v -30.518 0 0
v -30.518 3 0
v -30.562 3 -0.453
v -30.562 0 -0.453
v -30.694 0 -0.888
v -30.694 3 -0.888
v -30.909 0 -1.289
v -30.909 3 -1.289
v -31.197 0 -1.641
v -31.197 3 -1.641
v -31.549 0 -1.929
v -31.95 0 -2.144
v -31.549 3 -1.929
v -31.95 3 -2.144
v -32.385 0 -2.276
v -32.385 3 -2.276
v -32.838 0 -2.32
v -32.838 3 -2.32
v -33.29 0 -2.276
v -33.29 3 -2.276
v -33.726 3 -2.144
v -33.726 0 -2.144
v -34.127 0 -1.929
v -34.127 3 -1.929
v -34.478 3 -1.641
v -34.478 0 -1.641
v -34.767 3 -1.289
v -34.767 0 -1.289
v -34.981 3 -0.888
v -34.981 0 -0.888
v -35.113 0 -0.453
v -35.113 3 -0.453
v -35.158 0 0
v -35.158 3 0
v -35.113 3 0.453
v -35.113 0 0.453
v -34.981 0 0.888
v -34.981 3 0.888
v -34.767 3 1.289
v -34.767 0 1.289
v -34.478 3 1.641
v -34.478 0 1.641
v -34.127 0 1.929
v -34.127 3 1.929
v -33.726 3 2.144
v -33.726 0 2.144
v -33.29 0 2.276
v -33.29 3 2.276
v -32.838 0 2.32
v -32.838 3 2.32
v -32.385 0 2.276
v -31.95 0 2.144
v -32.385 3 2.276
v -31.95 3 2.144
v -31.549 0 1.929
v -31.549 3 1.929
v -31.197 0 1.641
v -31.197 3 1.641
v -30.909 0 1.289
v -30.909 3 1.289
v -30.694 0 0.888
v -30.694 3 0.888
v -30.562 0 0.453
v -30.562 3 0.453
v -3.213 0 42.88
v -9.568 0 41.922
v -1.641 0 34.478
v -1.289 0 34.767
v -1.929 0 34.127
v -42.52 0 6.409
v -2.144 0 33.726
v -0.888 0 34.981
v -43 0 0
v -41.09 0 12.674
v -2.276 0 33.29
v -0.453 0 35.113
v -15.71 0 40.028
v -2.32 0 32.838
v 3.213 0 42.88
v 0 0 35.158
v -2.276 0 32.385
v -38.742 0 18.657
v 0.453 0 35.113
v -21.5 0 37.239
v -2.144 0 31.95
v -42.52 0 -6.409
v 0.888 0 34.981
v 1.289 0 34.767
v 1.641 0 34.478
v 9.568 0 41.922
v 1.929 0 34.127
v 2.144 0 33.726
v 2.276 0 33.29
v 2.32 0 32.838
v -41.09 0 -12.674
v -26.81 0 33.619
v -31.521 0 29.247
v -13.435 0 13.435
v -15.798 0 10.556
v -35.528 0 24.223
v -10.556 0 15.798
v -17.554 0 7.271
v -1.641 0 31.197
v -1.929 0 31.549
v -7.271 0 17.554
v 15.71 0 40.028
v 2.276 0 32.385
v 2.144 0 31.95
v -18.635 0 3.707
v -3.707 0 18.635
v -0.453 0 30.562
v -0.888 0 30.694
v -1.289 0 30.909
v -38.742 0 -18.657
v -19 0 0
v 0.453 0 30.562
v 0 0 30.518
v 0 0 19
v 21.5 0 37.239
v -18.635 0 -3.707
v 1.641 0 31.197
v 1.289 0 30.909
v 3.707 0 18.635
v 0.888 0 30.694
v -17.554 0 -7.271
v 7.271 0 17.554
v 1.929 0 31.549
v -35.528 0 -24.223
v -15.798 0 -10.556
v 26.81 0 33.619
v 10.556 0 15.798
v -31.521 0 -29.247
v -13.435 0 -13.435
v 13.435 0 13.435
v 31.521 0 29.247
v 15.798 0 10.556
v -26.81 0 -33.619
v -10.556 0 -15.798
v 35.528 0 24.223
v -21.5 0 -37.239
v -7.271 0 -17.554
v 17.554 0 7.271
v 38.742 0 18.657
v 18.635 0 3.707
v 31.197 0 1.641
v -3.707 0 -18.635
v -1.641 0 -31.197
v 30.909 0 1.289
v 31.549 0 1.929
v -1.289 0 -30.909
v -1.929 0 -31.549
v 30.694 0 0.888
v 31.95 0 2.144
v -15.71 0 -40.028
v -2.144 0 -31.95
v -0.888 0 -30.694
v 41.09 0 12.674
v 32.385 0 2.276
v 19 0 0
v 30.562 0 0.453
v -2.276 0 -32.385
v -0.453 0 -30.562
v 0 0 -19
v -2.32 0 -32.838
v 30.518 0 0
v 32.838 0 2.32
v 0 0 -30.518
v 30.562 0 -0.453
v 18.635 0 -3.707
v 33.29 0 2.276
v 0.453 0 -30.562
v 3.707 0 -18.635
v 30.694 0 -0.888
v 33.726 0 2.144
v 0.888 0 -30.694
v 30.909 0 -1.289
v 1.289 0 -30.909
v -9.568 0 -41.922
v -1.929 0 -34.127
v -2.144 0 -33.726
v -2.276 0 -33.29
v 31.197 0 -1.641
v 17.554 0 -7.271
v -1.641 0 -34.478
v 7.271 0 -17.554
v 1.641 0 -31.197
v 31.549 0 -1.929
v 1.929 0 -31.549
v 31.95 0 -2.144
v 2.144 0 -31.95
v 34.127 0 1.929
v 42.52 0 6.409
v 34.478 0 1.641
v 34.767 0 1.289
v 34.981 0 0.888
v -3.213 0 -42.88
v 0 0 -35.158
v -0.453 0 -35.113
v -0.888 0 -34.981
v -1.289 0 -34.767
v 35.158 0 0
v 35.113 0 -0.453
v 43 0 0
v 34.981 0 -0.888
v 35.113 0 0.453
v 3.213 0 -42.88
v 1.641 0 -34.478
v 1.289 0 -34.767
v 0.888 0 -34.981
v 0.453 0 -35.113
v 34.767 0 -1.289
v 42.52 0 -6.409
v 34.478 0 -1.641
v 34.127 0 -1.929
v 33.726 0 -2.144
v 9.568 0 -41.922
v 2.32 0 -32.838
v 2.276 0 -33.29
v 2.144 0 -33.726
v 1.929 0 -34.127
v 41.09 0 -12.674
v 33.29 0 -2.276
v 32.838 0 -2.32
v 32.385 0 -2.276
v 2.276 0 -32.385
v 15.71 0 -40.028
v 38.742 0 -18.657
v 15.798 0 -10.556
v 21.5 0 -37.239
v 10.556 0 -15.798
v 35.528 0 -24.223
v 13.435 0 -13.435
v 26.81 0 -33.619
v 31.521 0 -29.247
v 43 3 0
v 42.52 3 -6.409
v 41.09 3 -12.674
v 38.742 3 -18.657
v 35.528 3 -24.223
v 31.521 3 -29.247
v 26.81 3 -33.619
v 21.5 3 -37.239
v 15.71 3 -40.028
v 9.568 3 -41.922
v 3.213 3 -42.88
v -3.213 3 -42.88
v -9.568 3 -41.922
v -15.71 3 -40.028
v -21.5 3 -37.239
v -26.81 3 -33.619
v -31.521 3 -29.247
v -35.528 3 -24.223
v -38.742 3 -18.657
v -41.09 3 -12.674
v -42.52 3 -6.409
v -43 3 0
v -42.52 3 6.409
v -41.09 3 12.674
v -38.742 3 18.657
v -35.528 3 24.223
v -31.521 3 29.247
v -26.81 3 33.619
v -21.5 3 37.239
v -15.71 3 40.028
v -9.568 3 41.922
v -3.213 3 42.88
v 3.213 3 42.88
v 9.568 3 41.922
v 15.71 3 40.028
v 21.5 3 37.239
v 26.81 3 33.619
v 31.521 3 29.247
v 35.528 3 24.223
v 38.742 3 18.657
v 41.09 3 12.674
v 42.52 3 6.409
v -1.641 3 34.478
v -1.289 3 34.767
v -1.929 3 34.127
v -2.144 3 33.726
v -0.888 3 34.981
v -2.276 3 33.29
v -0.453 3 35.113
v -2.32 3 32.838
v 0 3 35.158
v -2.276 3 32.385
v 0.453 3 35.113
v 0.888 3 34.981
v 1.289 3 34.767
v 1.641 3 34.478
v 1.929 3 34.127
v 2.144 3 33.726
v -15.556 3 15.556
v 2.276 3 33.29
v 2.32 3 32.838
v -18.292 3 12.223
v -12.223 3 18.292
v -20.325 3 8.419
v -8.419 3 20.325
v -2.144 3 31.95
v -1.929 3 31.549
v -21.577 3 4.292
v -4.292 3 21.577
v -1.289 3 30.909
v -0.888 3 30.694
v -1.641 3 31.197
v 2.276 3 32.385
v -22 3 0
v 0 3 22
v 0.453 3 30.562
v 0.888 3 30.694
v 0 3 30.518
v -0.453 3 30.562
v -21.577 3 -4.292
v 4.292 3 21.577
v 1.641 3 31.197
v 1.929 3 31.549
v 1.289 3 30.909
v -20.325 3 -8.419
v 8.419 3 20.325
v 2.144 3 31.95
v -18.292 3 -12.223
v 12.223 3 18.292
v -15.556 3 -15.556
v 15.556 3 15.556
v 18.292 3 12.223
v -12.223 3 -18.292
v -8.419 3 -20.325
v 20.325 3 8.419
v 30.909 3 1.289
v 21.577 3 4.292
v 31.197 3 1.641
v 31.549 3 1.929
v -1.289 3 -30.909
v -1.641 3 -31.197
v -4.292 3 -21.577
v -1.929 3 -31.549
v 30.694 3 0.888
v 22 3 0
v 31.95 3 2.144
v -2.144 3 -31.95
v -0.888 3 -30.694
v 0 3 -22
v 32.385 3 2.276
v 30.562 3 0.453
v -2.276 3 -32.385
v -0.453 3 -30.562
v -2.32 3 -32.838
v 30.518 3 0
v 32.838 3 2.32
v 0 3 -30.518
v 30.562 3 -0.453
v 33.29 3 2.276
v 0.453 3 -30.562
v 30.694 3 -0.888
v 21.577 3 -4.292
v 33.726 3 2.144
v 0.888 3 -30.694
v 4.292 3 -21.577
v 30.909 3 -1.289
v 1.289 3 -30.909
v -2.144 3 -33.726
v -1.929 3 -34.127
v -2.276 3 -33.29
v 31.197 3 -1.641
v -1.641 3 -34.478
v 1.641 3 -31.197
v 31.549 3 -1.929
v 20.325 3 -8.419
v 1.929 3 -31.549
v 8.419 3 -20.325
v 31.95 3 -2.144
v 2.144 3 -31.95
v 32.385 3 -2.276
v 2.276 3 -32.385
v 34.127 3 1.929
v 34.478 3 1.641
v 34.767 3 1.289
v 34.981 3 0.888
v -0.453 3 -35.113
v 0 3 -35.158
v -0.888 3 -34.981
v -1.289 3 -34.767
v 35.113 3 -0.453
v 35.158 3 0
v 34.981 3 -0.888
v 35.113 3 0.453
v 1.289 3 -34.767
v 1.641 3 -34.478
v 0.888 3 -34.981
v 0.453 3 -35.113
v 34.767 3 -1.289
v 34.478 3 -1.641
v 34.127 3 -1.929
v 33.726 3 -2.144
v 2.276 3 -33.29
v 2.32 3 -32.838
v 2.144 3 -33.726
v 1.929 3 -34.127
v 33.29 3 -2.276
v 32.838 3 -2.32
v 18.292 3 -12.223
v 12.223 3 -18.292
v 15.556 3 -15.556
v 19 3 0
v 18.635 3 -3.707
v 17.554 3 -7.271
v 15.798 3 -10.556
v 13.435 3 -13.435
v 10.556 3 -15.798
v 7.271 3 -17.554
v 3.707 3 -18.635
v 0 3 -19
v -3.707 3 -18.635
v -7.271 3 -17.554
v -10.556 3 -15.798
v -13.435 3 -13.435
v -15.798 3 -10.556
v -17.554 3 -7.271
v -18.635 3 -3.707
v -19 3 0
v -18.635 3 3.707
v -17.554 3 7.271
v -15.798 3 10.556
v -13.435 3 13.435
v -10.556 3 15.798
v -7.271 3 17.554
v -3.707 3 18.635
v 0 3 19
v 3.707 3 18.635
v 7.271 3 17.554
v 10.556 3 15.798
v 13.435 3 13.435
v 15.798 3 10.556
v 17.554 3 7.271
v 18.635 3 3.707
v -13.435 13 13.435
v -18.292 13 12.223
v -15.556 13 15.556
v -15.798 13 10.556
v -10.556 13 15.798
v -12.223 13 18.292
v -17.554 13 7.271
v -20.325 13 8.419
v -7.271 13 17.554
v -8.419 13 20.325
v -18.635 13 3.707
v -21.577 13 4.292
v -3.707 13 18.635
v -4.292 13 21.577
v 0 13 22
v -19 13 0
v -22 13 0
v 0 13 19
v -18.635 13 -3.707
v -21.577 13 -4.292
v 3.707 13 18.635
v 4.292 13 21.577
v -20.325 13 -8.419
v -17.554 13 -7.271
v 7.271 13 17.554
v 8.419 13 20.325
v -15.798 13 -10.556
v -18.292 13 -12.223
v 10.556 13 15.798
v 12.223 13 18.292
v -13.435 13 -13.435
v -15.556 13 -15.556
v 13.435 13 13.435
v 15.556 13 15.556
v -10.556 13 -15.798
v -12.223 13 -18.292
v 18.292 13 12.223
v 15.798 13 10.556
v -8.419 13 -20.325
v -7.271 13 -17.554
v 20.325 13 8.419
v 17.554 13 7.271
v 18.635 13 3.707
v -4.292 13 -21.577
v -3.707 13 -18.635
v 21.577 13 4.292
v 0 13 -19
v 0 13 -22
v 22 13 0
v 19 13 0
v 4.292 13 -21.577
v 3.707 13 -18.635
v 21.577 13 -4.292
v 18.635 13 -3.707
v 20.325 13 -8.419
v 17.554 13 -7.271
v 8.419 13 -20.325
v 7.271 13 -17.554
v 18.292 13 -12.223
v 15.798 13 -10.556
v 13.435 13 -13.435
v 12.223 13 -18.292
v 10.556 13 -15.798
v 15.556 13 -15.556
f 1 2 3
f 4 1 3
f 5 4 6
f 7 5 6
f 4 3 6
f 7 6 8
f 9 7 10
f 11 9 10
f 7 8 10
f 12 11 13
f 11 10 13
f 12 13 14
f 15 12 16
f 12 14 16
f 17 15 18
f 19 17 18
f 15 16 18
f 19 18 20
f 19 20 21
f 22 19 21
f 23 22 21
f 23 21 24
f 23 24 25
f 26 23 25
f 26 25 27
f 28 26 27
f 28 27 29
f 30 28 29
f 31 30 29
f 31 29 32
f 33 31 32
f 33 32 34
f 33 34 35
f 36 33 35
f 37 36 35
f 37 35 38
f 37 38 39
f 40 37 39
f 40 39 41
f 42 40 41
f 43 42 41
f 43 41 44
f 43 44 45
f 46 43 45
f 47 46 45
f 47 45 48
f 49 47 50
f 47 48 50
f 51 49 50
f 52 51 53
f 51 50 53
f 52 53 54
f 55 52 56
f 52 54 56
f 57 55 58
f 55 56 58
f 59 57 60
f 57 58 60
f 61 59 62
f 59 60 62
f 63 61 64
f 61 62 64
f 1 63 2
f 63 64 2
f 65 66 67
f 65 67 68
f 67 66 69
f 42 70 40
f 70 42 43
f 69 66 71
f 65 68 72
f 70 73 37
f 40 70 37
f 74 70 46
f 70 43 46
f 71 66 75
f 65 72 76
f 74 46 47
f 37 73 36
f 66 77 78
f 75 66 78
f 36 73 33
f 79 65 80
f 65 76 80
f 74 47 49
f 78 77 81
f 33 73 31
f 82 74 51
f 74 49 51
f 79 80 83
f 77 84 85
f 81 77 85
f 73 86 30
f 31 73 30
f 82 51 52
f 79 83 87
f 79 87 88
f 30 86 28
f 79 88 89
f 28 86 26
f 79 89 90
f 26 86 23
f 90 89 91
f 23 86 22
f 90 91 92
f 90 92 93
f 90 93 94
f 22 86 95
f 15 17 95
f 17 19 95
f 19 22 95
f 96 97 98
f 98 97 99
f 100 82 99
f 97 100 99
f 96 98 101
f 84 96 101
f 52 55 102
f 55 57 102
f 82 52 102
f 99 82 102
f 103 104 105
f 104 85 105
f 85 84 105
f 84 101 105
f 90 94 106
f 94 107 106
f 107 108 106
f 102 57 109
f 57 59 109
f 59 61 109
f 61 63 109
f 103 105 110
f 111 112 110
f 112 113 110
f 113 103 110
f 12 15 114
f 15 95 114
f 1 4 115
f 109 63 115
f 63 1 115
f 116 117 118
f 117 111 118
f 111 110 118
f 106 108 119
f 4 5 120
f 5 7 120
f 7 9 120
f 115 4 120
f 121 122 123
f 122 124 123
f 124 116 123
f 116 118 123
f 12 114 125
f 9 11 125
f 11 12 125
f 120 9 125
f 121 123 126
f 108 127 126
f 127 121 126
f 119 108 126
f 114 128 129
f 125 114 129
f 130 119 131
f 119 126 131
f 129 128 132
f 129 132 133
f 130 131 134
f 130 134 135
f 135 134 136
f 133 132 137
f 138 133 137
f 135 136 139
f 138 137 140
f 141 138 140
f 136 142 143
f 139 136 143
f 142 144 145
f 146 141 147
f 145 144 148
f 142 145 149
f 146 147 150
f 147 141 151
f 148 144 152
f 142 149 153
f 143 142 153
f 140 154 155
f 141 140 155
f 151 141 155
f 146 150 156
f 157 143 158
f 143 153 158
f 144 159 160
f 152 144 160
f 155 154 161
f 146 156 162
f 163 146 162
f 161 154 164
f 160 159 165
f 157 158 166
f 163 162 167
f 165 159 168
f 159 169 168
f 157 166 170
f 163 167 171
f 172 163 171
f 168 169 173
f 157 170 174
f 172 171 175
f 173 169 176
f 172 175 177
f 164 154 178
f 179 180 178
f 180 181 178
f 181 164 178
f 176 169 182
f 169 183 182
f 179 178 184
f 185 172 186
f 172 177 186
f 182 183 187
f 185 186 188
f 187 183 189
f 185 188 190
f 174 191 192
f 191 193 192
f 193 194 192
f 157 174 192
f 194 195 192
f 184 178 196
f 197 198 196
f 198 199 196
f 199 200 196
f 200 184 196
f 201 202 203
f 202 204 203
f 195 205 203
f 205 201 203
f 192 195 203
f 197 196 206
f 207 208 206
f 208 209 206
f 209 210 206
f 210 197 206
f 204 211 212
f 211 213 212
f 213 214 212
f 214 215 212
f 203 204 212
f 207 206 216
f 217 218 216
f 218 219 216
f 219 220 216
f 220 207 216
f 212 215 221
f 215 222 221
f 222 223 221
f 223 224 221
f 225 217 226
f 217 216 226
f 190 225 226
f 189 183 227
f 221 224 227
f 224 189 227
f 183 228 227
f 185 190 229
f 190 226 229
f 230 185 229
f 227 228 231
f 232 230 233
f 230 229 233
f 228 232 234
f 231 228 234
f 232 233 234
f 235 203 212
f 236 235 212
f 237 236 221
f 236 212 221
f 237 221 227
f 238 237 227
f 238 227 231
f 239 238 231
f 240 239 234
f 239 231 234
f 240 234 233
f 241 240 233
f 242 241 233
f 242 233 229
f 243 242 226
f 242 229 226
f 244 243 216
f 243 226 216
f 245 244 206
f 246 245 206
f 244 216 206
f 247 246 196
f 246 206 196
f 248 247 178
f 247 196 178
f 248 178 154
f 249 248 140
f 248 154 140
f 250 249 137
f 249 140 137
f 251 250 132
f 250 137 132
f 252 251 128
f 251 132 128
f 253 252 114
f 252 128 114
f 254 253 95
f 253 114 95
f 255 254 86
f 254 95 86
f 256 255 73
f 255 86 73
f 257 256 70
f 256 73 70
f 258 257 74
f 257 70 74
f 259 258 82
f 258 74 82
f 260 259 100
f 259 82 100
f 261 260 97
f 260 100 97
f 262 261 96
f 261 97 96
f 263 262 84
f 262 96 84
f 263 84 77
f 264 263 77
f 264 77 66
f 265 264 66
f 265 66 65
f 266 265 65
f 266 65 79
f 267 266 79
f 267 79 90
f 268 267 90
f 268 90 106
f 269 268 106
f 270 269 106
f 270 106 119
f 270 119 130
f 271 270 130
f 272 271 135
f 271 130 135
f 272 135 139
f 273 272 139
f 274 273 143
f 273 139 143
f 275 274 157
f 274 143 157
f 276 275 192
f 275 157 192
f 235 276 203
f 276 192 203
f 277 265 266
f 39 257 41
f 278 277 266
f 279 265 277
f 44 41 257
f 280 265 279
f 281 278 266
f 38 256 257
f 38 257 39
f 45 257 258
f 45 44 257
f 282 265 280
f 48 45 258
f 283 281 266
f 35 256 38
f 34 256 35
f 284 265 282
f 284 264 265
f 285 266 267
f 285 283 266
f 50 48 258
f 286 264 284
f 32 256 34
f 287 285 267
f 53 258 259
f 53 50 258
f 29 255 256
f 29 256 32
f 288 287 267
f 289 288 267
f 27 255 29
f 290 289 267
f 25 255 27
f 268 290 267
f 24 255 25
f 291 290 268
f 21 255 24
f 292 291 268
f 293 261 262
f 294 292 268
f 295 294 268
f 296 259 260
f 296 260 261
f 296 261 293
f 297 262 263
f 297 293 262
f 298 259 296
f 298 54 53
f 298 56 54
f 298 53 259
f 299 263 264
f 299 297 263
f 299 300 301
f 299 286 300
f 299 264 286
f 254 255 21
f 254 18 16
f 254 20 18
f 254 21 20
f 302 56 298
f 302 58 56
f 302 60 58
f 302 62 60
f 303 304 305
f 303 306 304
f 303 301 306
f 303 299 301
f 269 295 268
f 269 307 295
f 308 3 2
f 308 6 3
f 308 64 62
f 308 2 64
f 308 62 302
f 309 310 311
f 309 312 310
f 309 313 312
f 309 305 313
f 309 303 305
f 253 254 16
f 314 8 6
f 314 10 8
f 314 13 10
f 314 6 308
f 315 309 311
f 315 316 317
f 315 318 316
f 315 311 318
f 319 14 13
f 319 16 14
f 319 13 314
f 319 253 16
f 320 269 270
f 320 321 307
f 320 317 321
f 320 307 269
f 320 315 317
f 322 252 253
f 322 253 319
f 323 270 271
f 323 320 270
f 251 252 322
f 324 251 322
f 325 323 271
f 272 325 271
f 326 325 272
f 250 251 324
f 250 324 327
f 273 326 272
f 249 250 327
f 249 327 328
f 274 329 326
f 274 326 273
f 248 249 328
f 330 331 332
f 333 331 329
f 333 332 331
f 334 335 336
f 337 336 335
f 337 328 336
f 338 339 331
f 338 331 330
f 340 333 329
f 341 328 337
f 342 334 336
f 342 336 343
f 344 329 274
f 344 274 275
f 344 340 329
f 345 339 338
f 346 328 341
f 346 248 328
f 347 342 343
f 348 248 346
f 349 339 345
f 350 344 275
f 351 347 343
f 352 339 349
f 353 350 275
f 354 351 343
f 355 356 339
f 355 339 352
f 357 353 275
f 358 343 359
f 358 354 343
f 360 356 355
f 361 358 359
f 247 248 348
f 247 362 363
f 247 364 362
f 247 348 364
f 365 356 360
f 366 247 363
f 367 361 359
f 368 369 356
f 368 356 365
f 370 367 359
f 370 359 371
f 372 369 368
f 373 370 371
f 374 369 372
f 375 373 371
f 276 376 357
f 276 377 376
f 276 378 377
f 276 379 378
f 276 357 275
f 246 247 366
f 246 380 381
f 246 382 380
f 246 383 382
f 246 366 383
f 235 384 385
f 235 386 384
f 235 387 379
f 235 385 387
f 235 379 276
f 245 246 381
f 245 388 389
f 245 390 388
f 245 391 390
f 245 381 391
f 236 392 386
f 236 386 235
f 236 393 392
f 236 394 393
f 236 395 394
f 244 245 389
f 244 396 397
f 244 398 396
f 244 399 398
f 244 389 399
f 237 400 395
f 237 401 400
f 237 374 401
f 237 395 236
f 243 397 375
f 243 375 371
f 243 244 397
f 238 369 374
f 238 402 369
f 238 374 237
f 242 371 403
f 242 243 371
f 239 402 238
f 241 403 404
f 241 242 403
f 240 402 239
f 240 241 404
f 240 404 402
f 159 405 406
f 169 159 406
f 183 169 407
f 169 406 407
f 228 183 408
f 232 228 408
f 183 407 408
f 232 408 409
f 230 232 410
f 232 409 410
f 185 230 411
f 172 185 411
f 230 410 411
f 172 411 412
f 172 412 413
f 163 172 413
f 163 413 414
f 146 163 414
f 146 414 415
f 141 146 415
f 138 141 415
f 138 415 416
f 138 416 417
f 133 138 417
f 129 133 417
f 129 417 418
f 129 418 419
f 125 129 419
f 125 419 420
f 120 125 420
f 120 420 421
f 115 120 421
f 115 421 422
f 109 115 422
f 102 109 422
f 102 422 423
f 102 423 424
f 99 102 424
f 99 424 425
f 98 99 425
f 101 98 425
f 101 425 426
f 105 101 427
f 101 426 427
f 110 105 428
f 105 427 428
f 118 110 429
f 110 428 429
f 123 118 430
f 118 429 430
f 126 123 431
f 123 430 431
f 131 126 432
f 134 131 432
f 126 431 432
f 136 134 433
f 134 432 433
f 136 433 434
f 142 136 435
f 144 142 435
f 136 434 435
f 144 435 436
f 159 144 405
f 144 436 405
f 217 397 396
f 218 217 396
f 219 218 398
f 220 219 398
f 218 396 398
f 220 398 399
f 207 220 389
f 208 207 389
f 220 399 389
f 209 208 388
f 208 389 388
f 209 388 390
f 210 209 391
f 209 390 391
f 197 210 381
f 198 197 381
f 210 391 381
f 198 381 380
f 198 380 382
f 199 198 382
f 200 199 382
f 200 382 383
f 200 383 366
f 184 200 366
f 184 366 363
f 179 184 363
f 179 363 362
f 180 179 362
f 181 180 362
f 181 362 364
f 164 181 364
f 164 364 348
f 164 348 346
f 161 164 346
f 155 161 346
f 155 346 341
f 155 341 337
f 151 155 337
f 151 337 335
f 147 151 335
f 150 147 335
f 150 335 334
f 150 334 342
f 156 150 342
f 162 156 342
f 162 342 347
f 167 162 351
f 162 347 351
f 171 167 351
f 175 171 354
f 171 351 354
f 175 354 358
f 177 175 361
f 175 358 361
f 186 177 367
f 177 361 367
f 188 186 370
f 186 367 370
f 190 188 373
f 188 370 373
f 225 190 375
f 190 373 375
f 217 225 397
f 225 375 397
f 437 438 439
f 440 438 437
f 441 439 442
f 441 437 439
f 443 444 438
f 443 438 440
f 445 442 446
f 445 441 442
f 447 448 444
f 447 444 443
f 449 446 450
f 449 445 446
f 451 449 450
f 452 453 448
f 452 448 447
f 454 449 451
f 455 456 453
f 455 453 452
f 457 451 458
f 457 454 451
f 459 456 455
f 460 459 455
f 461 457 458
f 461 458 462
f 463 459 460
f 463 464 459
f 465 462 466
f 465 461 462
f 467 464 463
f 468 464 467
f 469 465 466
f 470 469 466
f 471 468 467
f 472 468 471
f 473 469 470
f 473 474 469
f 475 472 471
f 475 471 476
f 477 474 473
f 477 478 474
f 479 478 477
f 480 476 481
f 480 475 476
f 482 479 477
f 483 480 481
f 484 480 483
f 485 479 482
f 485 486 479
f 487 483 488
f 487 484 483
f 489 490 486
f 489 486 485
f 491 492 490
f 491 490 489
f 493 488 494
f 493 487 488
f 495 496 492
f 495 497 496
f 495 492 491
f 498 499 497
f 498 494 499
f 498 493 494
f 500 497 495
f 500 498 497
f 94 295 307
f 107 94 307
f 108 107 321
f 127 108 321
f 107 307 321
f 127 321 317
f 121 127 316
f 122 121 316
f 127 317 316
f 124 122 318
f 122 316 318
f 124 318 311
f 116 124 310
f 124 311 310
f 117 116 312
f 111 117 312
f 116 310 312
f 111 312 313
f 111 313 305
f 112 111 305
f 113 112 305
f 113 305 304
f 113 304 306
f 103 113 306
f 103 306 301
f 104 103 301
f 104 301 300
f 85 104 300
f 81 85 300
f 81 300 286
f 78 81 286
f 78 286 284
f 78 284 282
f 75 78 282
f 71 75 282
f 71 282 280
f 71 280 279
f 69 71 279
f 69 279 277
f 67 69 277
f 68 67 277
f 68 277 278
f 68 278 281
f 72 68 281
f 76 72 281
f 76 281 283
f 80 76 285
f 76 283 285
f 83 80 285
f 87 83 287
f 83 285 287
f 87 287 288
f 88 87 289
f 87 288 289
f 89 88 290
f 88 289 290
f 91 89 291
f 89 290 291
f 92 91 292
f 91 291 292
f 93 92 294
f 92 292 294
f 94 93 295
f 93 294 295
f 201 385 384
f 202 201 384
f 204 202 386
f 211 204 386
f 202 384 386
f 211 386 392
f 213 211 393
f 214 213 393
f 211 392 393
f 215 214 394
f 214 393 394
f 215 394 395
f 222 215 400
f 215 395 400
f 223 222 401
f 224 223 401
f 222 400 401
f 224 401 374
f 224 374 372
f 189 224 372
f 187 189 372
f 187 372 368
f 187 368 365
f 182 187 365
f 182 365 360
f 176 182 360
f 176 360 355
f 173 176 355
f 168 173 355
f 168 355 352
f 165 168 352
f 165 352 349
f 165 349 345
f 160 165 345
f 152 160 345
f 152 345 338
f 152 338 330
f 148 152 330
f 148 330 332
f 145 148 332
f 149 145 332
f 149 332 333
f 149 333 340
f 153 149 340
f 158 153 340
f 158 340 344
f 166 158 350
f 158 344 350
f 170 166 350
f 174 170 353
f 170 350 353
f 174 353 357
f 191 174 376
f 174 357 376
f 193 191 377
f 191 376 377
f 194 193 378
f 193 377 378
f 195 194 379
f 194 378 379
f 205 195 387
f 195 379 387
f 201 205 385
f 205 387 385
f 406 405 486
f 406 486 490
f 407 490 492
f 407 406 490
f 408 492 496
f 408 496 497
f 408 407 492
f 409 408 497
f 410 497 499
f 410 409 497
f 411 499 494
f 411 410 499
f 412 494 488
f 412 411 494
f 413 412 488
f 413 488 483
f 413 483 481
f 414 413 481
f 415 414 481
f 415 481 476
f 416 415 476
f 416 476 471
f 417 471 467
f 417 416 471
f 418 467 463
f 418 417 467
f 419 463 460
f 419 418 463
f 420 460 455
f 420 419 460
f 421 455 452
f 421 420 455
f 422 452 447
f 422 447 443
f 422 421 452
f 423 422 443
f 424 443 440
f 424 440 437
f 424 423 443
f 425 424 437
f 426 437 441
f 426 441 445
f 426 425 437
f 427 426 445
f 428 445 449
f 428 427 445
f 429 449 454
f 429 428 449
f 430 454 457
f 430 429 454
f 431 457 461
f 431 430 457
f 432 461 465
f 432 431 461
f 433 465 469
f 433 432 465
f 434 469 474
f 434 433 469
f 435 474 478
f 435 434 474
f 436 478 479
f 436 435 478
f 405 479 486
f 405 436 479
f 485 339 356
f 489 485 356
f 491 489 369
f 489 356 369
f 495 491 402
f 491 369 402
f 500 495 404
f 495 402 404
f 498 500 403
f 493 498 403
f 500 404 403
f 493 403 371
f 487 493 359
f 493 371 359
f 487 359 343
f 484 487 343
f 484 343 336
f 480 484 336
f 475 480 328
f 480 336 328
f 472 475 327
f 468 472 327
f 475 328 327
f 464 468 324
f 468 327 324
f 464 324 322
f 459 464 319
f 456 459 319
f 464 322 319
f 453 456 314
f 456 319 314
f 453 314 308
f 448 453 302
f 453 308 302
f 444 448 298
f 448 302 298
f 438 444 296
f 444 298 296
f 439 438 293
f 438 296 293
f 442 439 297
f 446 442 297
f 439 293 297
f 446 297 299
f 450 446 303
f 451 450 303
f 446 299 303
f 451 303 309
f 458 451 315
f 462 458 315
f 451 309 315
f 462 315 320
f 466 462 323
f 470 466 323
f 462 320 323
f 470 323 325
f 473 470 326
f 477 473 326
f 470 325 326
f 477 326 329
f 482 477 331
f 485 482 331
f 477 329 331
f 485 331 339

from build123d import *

# Parameters (mm, degrees)
SKETCH_1_R          = 43
EXTRUDE_1_DEPTH     = 3
SKETCH_2_R          = 22
SKETCH_2_R_2        = 19
EXTRUDE_2_DEPTH     = 10
SKETCH_3_R          = 19
SKETCH_3_R_2        = 2.320189094
CUT_EXTRUDE_1_DEPTH = 20


with BuildPart() as part:
    # 草图1 → 凸台-拉伸1 (new body)
    with BuildSketch(Plane(origin=(0, 0, 0), x_dir=(1, 0, 0), z_dir=(0, 1, 0))):
        Circle(SKETCH_1_R)
    extrude(amount=EXTRUDE_1_DEPTH)

    # 草图2 → 凸台-拉伸2 (add)
    with BuildSketch(Plane(origin=(0, 3, 0), x_dir=(1, 0, 0), z_dir=(0, 1, 0))):
        Circle(SKETCH_2_R)
        Circle(SKETCH_2_R_2, mode=Mode.SUBTRACT)
    extrude(amount=EXTRUDE_2_DEPTH)

    # 草图3 → 切除-拉伸1 (cut)
    with BuildSketch(Plane(origin=(0, 3, 0), x_dir=(1, 0, 0), z_dir=(0, 1, 0))):
        Circle(SKETCH_3_R)
        with Locations((0, 32.837689205)):
            Circle(SKETCH_3_R_2)
        with Locations((32.837689205, 0)):
            Circle(SKETCH_3_R_2)
        with Locations((0, -32.837689205)):
            Circle(SKETCH_3_R_2)
        with Locations((-32.837689205, 0)):
            Circle(SKETCH_3_R_2)
    extrude(amount=-CUT_EXTRUDE_1_DEPTH, mode=Mode.SUBTRACT)


solid = part.part
